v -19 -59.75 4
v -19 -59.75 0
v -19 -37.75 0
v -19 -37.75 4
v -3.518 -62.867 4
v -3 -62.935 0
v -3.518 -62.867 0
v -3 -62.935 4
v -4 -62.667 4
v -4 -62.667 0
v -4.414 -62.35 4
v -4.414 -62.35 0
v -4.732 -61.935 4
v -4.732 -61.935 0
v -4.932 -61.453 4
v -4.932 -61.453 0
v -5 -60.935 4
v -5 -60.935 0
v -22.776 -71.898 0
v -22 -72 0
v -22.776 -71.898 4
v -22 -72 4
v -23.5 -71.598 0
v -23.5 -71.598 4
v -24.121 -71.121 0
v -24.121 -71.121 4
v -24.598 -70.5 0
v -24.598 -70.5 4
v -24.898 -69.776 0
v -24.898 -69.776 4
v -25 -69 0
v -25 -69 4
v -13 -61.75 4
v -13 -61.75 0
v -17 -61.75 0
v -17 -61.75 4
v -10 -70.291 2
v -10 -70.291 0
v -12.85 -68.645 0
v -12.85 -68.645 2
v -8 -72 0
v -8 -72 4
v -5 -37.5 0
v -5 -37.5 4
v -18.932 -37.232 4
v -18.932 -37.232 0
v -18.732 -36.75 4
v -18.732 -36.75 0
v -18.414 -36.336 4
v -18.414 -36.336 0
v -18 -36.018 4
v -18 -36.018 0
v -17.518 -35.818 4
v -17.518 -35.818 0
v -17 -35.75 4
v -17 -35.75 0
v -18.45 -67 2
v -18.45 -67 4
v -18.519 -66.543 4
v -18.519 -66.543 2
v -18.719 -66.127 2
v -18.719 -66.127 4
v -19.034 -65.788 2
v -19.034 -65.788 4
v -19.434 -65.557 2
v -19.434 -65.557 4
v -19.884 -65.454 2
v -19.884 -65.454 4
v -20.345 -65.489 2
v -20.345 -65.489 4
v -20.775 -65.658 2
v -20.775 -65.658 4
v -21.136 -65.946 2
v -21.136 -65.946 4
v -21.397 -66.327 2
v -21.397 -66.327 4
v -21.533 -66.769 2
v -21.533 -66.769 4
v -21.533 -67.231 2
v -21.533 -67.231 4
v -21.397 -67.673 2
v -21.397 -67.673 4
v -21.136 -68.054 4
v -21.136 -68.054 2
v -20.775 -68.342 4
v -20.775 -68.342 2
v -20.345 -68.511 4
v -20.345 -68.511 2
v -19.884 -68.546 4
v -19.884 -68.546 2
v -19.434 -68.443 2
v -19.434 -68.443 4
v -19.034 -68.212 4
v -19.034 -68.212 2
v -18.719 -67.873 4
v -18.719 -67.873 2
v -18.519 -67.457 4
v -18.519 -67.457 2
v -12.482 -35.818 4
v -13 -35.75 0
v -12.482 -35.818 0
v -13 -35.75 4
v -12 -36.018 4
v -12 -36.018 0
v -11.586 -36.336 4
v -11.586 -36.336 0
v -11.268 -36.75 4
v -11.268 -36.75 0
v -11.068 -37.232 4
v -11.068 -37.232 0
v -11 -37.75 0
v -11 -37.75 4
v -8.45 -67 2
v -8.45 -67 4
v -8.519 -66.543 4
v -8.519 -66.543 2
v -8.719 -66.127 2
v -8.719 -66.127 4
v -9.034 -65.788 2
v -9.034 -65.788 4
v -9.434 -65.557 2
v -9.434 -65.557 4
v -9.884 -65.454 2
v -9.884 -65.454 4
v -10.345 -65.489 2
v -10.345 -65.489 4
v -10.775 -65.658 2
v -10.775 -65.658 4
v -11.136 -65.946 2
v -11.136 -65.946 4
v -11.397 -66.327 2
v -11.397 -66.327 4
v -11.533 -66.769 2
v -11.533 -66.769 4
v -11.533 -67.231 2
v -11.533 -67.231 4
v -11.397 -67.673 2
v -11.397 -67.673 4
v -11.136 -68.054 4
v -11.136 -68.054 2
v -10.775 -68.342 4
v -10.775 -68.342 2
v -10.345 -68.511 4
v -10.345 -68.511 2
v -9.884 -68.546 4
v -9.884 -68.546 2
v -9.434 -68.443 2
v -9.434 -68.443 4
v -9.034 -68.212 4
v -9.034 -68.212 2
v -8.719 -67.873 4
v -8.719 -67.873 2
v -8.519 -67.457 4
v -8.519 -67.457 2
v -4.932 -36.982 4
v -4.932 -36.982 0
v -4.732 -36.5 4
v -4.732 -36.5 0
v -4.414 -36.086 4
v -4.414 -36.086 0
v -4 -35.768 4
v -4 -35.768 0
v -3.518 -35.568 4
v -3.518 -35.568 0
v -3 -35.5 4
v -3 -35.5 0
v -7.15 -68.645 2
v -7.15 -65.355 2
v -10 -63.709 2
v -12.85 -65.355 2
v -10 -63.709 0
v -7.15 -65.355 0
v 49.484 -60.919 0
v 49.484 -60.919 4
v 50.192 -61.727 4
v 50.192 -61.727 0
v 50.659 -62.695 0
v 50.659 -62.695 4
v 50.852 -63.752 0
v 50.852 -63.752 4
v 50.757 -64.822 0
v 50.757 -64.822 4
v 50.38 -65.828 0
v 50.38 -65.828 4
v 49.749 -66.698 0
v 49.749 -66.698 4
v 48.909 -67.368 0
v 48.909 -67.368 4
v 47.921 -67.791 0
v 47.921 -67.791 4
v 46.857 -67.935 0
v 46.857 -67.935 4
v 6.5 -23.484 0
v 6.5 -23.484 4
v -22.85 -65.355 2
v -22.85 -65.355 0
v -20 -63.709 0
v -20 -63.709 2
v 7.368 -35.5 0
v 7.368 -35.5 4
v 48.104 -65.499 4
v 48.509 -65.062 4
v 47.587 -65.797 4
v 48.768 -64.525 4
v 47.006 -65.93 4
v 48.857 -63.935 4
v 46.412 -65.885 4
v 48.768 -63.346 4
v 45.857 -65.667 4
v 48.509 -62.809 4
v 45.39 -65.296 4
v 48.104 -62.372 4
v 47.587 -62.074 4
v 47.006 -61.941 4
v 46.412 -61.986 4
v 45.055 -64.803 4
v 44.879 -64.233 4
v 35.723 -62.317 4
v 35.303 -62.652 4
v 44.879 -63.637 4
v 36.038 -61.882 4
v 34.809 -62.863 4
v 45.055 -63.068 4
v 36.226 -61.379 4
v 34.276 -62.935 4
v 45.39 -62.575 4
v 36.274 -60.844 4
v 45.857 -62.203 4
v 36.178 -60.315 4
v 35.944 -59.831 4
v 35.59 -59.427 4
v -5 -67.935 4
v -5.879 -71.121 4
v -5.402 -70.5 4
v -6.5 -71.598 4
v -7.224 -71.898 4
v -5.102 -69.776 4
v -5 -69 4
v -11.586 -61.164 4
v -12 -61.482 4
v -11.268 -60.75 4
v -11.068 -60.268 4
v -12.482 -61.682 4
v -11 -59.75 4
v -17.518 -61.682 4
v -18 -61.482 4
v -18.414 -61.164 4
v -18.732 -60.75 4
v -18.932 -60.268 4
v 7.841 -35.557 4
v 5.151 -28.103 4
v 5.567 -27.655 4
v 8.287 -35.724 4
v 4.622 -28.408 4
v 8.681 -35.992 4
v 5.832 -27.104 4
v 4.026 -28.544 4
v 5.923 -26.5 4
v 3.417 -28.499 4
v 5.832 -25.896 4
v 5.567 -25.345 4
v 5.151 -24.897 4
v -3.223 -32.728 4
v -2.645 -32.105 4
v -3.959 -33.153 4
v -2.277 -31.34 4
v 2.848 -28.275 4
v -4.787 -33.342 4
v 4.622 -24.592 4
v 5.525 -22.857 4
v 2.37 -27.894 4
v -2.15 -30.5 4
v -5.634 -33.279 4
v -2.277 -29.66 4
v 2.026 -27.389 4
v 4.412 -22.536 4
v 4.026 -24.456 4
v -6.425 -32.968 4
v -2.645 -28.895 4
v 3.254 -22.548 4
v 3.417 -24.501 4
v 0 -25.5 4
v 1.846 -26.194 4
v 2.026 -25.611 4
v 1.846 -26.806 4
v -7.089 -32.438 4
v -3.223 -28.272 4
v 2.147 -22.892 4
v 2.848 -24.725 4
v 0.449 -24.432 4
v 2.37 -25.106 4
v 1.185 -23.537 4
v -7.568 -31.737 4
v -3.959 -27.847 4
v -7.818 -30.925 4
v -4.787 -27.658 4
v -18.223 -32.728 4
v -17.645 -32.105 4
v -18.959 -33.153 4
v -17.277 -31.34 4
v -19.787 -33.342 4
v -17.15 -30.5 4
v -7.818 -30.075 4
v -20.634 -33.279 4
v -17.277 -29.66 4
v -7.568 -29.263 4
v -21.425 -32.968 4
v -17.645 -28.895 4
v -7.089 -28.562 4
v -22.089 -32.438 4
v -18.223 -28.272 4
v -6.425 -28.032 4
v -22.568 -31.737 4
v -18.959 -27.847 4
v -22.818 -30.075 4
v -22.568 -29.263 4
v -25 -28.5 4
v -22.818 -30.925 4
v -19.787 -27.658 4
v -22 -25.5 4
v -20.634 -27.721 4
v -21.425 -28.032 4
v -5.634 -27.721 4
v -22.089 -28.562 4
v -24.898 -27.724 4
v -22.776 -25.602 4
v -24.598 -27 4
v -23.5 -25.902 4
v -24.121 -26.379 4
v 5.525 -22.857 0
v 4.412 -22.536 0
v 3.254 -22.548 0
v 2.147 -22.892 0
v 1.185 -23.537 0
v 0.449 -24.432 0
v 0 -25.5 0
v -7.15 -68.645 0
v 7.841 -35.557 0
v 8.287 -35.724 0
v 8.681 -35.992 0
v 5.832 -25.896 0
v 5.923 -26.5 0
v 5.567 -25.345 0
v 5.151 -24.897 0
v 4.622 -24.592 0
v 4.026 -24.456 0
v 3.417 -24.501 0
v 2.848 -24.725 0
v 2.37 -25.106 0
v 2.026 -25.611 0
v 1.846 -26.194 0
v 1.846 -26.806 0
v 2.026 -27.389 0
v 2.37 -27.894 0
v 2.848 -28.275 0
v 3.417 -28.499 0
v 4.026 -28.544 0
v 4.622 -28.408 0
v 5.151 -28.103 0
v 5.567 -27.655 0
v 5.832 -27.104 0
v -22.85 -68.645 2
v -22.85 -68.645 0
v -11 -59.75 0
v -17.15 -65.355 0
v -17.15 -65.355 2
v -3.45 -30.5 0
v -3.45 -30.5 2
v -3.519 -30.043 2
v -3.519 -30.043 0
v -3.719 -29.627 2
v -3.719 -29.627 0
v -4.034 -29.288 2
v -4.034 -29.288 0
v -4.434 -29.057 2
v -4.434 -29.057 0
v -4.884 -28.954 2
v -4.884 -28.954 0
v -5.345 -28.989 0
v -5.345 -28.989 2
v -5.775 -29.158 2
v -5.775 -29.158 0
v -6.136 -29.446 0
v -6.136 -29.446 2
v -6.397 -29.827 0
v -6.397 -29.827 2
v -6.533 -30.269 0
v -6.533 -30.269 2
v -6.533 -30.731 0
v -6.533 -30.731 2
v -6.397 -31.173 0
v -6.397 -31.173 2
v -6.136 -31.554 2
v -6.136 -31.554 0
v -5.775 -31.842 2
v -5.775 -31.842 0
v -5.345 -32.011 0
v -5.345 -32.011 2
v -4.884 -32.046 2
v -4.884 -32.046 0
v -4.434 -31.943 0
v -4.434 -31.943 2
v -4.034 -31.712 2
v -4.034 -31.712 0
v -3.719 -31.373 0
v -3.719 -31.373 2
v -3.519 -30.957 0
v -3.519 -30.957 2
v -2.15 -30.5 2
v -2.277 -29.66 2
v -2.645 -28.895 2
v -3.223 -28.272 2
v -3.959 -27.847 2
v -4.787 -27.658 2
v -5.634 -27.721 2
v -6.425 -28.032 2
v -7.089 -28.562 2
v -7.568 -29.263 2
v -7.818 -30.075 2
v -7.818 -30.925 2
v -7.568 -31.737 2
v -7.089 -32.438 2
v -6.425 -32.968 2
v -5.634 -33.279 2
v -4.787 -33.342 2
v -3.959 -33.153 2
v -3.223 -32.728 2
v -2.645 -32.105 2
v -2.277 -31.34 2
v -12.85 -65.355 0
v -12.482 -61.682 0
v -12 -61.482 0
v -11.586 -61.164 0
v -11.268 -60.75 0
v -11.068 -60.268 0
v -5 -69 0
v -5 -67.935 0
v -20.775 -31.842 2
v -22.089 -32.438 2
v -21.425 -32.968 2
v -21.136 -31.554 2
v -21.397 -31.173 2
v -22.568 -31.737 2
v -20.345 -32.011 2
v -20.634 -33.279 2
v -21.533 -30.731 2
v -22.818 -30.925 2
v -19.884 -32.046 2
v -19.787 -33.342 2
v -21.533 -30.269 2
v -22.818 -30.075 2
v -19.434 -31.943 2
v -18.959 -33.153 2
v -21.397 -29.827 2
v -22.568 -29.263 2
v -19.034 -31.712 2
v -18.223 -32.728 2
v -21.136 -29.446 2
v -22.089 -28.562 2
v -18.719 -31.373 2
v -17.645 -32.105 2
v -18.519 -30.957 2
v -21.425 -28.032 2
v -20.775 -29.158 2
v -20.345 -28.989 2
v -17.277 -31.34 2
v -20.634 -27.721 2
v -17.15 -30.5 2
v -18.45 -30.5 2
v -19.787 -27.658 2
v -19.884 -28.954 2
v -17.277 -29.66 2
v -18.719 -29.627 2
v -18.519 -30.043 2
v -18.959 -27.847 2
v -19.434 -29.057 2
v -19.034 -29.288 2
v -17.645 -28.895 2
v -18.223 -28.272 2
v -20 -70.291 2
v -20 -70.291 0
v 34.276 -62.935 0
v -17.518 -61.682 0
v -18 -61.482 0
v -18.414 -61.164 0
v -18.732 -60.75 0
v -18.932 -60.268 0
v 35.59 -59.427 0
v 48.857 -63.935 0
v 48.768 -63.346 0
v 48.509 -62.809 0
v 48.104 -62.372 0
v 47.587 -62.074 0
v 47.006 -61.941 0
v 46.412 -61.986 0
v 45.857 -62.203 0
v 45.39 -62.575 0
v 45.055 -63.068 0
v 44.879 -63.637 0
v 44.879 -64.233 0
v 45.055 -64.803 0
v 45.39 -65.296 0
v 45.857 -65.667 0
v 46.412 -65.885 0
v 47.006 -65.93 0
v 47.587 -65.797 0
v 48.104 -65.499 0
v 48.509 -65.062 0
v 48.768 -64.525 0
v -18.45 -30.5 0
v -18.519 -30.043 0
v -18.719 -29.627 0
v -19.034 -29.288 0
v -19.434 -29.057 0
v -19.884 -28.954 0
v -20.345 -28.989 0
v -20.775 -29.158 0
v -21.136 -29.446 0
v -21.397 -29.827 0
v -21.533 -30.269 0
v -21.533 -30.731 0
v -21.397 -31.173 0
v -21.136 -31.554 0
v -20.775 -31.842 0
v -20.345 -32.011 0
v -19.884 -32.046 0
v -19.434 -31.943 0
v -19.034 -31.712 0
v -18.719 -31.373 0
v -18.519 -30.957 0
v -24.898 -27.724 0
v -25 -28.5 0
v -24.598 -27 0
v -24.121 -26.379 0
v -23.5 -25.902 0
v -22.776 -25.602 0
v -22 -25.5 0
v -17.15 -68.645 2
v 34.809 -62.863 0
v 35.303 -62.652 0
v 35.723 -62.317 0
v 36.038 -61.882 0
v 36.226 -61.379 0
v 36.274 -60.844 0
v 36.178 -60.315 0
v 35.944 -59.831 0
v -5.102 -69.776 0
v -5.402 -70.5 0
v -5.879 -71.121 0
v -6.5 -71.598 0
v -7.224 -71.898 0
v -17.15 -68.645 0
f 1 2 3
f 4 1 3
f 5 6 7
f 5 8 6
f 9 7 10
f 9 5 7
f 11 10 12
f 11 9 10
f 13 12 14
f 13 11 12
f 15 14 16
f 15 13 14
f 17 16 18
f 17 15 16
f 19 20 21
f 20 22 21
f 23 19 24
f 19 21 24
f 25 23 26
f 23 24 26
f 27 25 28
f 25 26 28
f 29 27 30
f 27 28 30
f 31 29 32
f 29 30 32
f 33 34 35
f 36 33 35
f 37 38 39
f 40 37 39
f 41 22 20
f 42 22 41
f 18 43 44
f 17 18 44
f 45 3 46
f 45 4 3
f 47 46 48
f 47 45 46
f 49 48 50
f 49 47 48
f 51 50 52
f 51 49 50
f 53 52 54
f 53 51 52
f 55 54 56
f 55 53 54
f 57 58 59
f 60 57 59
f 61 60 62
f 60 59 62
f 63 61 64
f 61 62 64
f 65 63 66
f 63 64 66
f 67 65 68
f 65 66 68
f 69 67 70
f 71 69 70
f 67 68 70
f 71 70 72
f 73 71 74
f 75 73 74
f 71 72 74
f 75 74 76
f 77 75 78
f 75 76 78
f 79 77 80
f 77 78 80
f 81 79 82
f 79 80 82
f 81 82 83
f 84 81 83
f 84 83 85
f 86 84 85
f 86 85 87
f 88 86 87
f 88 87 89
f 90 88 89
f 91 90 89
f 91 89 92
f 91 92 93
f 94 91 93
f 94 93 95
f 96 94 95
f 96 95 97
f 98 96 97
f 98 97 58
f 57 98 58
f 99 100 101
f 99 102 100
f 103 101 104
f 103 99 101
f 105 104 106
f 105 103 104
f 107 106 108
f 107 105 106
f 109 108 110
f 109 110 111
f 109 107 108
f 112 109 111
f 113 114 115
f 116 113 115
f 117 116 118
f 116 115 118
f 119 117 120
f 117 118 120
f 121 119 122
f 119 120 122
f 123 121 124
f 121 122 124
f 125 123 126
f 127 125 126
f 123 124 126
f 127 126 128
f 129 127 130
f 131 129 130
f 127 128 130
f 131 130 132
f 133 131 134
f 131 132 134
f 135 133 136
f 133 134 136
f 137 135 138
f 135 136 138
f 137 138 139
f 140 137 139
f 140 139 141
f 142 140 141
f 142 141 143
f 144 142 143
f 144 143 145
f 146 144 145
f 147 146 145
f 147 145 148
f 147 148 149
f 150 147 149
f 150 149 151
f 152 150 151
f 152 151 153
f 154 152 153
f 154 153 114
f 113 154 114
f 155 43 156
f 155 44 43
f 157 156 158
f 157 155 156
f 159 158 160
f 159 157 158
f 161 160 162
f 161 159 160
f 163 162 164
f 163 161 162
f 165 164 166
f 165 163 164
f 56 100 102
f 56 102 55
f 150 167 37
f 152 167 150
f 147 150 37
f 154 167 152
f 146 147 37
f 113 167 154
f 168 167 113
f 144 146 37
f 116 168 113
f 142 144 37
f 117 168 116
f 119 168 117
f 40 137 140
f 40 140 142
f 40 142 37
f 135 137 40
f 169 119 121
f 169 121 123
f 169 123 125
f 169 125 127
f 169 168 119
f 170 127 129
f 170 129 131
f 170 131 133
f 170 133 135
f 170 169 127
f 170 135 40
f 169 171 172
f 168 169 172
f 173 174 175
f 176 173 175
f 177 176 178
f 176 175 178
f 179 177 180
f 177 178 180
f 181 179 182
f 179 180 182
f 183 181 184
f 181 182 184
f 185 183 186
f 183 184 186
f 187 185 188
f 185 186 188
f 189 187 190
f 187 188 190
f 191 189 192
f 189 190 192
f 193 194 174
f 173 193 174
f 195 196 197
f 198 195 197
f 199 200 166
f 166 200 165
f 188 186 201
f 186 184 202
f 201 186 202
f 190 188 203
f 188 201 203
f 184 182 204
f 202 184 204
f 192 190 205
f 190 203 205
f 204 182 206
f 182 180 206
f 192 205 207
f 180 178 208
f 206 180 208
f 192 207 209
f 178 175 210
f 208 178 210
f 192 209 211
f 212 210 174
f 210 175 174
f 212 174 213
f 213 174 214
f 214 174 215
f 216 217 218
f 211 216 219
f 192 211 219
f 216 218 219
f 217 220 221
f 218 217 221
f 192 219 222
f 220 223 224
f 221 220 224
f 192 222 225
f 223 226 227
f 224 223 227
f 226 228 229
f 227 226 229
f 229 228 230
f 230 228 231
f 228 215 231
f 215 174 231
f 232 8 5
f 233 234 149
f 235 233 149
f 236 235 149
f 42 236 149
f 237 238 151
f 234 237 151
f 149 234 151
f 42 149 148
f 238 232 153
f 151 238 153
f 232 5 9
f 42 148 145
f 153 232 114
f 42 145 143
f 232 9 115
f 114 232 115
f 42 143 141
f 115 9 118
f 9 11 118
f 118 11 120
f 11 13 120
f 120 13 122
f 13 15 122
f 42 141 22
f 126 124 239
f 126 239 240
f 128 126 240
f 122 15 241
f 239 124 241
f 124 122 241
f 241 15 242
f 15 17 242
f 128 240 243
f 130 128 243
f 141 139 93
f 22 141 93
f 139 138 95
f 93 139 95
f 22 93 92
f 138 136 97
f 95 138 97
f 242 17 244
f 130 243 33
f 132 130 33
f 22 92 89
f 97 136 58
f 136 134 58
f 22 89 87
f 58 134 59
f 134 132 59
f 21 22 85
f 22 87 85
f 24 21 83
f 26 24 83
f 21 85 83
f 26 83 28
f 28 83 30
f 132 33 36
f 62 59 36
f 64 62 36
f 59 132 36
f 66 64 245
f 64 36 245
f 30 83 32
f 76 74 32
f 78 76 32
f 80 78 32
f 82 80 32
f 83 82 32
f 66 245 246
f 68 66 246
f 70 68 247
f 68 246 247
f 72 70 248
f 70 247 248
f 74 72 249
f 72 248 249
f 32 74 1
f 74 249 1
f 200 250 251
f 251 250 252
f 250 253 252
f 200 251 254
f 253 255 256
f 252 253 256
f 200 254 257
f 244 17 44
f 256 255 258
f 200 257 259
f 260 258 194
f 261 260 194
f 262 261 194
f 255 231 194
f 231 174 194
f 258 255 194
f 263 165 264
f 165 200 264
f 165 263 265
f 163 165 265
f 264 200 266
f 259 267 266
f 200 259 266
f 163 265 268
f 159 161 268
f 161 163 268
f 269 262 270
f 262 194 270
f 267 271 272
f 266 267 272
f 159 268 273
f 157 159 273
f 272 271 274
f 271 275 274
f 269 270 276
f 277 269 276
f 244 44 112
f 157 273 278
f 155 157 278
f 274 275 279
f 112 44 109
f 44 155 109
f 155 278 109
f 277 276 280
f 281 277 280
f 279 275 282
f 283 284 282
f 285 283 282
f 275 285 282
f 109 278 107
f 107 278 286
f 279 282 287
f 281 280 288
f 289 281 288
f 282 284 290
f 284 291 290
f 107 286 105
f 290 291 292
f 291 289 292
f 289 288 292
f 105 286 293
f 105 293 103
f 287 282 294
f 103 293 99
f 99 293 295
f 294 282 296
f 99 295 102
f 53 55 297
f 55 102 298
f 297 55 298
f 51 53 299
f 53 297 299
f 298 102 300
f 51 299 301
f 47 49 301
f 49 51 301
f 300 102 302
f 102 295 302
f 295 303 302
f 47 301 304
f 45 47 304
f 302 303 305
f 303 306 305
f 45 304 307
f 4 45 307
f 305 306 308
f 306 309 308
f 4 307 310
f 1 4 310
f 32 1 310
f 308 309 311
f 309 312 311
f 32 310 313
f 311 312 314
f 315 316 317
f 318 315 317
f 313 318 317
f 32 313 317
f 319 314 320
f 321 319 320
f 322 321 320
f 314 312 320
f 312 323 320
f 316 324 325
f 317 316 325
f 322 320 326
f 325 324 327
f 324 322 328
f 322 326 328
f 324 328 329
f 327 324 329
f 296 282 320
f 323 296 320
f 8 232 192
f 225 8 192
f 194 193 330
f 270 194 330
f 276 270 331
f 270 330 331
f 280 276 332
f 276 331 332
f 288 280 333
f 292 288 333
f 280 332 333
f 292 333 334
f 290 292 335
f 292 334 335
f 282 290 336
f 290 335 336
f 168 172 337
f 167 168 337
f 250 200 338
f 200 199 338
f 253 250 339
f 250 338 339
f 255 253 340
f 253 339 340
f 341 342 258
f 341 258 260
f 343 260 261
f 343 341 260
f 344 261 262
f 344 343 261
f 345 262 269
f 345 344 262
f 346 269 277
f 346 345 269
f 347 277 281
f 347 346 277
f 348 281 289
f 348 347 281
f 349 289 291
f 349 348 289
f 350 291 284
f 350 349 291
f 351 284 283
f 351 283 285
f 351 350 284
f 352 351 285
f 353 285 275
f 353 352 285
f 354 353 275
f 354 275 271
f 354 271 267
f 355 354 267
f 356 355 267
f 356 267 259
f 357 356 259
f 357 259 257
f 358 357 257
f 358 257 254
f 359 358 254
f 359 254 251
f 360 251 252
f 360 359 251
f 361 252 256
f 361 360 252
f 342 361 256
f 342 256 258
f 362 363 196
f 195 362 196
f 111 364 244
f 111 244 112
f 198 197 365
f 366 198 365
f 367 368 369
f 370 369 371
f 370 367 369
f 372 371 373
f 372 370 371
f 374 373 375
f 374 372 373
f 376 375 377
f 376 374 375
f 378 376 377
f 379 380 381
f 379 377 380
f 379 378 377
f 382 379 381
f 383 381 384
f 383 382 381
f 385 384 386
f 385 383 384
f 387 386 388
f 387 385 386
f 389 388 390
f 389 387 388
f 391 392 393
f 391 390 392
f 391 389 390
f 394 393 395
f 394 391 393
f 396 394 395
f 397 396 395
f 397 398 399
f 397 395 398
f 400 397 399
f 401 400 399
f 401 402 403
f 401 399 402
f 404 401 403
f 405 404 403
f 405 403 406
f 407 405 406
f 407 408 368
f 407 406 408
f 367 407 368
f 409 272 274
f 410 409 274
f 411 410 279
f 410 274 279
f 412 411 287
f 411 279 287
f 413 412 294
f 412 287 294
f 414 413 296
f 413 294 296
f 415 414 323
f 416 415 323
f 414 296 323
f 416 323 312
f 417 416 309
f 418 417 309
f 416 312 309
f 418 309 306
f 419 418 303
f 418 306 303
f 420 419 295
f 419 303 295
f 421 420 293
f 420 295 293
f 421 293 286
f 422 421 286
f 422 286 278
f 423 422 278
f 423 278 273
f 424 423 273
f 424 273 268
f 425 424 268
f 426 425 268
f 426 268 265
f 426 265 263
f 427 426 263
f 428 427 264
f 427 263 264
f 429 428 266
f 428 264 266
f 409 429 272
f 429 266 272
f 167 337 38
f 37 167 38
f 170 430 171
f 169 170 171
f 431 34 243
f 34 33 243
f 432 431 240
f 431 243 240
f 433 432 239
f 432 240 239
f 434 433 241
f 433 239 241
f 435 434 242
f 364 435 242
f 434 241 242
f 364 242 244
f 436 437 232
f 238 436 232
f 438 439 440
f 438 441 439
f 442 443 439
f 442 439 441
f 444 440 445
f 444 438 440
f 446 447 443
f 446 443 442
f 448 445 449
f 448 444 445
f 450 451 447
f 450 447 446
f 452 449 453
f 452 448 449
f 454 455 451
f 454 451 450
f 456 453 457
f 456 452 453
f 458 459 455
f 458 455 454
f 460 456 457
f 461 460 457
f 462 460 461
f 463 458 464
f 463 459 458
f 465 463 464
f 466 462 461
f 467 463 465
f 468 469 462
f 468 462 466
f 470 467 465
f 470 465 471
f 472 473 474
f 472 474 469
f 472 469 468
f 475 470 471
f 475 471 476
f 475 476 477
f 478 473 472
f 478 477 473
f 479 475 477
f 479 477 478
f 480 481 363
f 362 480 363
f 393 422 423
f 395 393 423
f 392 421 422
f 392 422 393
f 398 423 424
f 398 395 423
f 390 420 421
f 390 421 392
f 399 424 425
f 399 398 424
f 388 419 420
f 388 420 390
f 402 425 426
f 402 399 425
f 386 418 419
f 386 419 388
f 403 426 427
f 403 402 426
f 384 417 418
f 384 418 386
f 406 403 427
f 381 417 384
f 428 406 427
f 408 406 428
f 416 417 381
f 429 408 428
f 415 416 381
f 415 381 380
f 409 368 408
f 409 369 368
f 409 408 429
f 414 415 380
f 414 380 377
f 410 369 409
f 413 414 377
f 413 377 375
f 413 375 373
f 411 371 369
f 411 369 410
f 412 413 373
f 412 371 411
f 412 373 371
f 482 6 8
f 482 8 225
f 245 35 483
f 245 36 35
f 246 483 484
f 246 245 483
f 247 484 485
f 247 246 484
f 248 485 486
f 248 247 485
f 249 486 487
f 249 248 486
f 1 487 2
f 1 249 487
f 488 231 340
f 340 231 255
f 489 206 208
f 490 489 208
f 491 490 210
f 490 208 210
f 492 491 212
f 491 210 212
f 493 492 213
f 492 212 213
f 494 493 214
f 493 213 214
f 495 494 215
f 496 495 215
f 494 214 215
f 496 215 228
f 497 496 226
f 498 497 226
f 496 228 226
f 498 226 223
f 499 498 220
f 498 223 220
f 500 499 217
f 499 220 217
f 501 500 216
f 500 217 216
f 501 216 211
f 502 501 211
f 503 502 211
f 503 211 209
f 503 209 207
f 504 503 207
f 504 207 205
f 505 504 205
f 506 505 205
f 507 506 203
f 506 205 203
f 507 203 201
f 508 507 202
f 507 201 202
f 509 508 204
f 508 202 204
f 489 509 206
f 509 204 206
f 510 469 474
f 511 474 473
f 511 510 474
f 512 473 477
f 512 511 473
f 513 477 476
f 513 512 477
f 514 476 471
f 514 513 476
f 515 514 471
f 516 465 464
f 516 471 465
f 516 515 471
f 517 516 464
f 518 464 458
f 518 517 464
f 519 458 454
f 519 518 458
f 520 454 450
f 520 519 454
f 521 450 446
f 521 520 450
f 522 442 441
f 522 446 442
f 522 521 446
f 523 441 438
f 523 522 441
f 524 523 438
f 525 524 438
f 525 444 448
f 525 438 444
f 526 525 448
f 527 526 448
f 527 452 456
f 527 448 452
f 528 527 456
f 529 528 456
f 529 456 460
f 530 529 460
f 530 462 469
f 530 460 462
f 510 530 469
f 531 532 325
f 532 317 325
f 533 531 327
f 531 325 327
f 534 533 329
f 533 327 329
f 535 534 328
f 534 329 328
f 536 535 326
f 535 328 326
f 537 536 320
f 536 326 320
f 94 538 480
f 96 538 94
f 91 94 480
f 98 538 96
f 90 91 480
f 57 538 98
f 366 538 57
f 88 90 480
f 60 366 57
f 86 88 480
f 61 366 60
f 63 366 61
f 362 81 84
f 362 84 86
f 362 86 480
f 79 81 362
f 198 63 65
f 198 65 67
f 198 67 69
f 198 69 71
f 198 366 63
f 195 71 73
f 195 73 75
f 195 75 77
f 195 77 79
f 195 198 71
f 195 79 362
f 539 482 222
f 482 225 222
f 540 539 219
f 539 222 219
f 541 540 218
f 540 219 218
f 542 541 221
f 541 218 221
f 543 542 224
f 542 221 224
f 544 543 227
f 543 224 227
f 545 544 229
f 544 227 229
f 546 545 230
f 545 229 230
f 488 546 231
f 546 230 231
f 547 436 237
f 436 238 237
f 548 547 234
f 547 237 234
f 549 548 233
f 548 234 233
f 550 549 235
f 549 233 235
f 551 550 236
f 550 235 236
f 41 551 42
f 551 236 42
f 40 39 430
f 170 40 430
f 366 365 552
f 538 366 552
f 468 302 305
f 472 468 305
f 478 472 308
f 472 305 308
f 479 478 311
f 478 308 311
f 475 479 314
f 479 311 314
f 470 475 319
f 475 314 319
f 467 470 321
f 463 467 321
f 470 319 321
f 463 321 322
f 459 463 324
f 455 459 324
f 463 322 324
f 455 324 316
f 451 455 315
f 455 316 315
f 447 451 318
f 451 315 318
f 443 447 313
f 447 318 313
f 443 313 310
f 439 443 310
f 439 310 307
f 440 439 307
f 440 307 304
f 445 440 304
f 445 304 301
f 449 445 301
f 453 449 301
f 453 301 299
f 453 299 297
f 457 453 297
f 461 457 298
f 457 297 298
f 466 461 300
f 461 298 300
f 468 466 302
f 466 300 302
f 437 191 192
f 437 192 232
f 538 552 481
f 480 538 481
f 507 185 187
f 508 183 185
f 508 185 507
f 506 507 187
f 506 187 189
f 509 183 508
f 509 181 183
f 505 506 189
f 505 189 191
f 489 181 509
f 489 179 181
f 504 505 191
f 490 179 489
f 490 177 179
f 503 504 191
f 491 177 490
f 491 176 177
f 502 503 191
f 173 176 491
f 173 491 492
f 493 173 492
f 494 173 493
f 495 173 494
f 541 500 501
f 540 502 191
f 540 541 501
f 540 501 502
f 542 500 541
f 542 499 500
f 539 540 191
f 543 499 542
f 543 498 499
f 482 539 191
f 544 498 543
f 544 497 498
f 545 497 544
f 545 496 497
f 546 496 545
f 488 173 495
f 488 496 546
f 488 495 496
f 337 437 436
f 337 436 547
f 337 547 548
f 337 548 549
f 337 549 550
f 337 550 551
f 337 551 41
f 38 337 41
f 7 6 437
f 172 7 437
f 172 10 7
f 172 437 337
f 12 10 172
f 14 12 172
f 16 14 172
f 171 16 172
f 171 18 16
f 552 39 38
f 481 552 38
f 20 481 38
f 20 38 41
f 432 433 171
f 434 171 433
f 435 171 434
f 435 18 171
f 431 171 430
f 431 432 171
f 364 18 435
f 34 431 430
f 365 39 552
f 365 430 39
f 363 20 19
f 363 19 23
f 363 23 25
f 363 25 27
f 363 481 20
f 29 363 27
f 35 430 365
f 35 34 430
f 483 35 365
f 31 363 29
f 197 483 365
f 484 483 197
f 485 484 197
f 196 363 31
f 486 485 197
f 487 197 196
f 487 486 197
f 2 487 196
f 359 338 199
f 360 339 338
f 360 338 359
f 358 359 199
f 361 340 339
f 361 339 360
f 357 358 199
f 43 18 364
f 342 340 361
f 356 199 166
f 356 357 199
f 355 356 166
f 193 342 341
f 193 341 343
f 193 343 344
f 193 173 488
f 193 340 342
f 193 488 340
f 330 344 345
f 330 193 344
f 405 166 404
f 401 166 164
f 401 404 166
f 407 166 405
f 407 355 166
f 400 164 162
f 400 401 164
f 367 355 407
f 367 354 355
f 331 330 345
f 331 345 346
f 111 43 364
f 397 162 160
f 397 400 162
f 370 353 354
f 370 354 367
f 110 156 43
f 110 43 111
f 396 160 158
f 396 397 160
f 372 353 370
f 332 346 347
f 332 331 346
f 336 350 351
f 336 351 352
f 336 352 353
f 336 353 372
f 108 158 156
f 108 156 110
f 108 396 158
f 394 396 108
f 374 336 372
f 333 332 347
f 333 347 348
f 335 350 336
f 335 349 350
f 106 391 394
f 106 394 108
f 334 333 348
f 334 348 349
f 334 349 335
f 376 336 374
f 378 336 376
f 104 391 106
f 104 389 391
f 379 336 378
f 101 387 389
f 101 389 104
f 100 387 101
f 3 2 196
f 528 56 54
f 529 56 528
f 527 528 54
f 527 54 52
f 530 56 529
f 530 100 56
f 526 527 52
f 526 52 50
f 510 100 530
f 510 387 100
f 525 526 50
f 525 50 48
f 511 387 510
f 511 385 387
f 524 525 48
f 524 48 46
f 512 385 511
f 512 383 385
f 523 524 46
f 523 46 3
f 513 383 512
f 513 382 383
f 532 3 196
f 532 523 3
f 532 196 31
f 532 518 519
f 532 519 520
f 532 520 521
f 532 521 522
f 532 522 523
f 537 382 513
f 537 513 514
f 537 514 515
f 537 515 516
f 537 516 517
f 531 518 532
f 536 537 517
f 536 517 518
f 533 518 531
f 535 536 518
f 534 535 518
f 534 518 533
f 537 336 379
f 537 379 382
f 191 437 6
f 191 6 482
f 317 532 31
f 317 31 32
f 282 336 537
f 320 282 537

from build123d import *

# Parameters (mm, degrees)
SKETCH1_R           = 1.55
SKETCH1_R_2         = 2.05
BOSS_EXTRUDE1_DEPTH = 4
SKETCH2_R           = 2
BOSS_EXTRUDE2_DEPTH = 4
SKETCH3_W           = 20
SKETCH3_H           = 4
BOSS_EXTRUDE3_DEPTH = 36.5
SKETCH4_R           = 1.55
CUT_EXTRUDE1_DEPTH  = 5
CUT_EXTRUDE2_DEPTH  = 2
BOSS_EXTRUDE4_DEPTH = 4
FILLET1_R           = 2
FILLET2_R           = 3
SKETCH7_W           = 8
SKETCH7_H           = 26
CUT_EXTRUDE3_DEPTH  = 10
FILLET3_R           = 2
SKETCH8_R           = 2.85
CUT_EXTRUDE4_DEPTH  = 2


with BuildPart() as part:
    # Sketch1 → Boss-Extrude1 (new body)
    with BuildSketch(Plane.XY):
        with BuildLine():
            Line((-25, -35.5), (0, -35.5))
            Line((0, -35.5), (7.872983346, -35.5))
            Line((7.872983346, -35.5), (7.872983346, -26.5))
            ThreePointArc((7.872983346, -26.5), (4.377000516, -22.531881215), (0, -25.5))
            Line((0, -25.5), (-25, -25.5))
            Line((-25, -25.5), (-25, -35.5))
        make_face()
        with Locations((-20, -30.5)):
            Circle(SKETCH1_R, mode=Mode.SUBTRACT)
        with Locations((-5, -30.5)):
            Circle(SKETCH1_R, mode=Mode.SUBTRACT)
        with Locations((3.872983346, -26.5)):
            Circle(SKETCH1_R_2, mode=Mode.SUBTRACT)
    extrude(amount=BOSS_EXTRUDE1_DEPTH)

    # Sketch2 → Boss-Extrude2 (add)
    with BuildSketch(Plane.XY.offset(4)):
        with BuildLine():
            Line((7.872983346, -35.5), (7.872983346, -26.5))
            ThreePointArc((7.872983346, -26.5), (7.513600322, -24.842921839), (6.50002933, -23.483606557))
            Line((6.50002933, -23.483606557), (49.483635887, -60.919011822))
            ThreePointArc((49.483635887, -60.919011822), (49.872983346, -66.562451248), (44.22954392, -66.951798707))
            Line((44.22954392, -66.951798707), (8.116358245, -35.5))
            Line((8.116358245, -35.5), (7.872983346, -35.5))
        make_face()
        with Locations((46.856589904, -63.935405265)):
            Circle(SKETCH2_R, mode=Mode.SUBTRACT)
    extrude(amount=-BOSS_EXTRUDE2_DEPTH)

    # Sketch3 → Boss-Extrude3 (add)
    with BuildSketch(Plane.XZ.offset(35.5)):
        with Locations((-15, 2)):
            Rectangle(SKETCH3_W, SKETCH3_H)
    extrude(amount=BOSS_EXTRUDE3_DEPTH)

    # Sketch4 → Cut-Extrude1 (cut, through all)
    with BuildSketch(Plane.XY.offset(4)):
        with Locations((-20, -67)):
            Circle(SKETCH4_R)
        with Locations((-10, -67)):
            Circle(SKETCH4_R)
    extrude(amount=-CUT_EXTRUDE1_DEPTH, mode=Mode.SUBTRACT)

    # Sketch5 → Cut-Extrude2 (cut)
    with BuildSketch(Plane(origin=(0, 0, 0), x_dir=(-1, 0, 0), z_dir=(0, 0, -1))):
        Polygon((22.85, -68.645448267), (22.85, -65.354551733), (20, -63.709103466), (17.15, -65.354551733), (17.15, -68.645448267), (20, -70.290896534), align=None)
        Polygon((12.85, -68.645448267), (12.85, -65.354551733), (10, -63.709103466), (7.15, -65.354551733), (7.15, -68.645448267), (10, -70.290896534), align=None)
    extrude(amount=-CUT_EXTRUDE2_DEPTH, mode=Mode.SUBTRACT)

    # Sketch6 → Boss-Extrude4 (add)
    with BuildSketch(Plane(origin=(0, 0, 0), x_dir=(-1, 0, 0), z_dir=(0, 0, -1))):
        with BuildLine():
            ThreePointArc((-44.22954392, -66.951798707), (-45.454016157, -67.681441421), (-46.856589904, -67.935405265))
            Line((-46.856589904, -67.935405265), (5, -67.935405265))
            Line((5, -67.935405265), (5, -62.935405265))
            Line((5, -62.935405265), (-39.617891547, -62.935405265))
            Line((-39.617891547, -62.935405265), (-44.22954392, -66.951798707))
        make_face()
    extrude(amount=-BOSS_EXTRUDE4_DEPTH)

    # Fillet1
    fillet1_edges = [part.edges().sort_by_distance(p)[0] for p in [
        (39.617891547, -62.935405265, 2),
        (-5, -62.935405265, 2),
        (8.116358245, -35.5, 2),
        (-5, -35.5, 2),
    ]]
    fillet(fillet1_edges, radius=FILLET1_R)

    # Fillet2
    fillet2_edges = [part.edges().sort_by_distance(p)[0] for p in [
        (-25, -25.5, 2),
        (-5, -72, 2),
        (-25, -72, 2),
    ]]
    fillet(fillet2_edges, radius=FILLET2_R)

    # Sketch7 → Cut-Extrude3 (cut)
    with BuildSketch(Plane(origin=(0, 0, 0), x_dir=(-1, 0, 0), z_dir=(0, 0, -1))):
        with Locations((15, -48.75)):
            Rectangle(SKETCH7_W, SKETCH7_H)
    extrude(amount=-CUT_EXTRUDE3_DEPTH, mode=Mode.SUBTRACT)

    # Fillet3
    fillet3_edges = [part.edges().sort_by_distance(p)[0] for p in [
        (-11, -61.75, 2),
        (-11, -35.75, 2),
        (-19, -35.75, 2),
        (-19, -61.75, 2),
    ]]
    fillet(fillet3_edges, radius=FILLET3_R)

    # Sketch8 → Cut-Extrude4 (cut)
    with BuildSketch(Plane.XY.offset(4)):
        with Locations((-20, -30.5)):
            Circle(SKETCH8_R)
        with Locations((-5, -30.5)):
            Circle(SKETCH8_R)
    extrude(amount=-CUT_EXTRUDE4_DEPTH, mode=Mode.SUBTRACT)


solid = part.part
